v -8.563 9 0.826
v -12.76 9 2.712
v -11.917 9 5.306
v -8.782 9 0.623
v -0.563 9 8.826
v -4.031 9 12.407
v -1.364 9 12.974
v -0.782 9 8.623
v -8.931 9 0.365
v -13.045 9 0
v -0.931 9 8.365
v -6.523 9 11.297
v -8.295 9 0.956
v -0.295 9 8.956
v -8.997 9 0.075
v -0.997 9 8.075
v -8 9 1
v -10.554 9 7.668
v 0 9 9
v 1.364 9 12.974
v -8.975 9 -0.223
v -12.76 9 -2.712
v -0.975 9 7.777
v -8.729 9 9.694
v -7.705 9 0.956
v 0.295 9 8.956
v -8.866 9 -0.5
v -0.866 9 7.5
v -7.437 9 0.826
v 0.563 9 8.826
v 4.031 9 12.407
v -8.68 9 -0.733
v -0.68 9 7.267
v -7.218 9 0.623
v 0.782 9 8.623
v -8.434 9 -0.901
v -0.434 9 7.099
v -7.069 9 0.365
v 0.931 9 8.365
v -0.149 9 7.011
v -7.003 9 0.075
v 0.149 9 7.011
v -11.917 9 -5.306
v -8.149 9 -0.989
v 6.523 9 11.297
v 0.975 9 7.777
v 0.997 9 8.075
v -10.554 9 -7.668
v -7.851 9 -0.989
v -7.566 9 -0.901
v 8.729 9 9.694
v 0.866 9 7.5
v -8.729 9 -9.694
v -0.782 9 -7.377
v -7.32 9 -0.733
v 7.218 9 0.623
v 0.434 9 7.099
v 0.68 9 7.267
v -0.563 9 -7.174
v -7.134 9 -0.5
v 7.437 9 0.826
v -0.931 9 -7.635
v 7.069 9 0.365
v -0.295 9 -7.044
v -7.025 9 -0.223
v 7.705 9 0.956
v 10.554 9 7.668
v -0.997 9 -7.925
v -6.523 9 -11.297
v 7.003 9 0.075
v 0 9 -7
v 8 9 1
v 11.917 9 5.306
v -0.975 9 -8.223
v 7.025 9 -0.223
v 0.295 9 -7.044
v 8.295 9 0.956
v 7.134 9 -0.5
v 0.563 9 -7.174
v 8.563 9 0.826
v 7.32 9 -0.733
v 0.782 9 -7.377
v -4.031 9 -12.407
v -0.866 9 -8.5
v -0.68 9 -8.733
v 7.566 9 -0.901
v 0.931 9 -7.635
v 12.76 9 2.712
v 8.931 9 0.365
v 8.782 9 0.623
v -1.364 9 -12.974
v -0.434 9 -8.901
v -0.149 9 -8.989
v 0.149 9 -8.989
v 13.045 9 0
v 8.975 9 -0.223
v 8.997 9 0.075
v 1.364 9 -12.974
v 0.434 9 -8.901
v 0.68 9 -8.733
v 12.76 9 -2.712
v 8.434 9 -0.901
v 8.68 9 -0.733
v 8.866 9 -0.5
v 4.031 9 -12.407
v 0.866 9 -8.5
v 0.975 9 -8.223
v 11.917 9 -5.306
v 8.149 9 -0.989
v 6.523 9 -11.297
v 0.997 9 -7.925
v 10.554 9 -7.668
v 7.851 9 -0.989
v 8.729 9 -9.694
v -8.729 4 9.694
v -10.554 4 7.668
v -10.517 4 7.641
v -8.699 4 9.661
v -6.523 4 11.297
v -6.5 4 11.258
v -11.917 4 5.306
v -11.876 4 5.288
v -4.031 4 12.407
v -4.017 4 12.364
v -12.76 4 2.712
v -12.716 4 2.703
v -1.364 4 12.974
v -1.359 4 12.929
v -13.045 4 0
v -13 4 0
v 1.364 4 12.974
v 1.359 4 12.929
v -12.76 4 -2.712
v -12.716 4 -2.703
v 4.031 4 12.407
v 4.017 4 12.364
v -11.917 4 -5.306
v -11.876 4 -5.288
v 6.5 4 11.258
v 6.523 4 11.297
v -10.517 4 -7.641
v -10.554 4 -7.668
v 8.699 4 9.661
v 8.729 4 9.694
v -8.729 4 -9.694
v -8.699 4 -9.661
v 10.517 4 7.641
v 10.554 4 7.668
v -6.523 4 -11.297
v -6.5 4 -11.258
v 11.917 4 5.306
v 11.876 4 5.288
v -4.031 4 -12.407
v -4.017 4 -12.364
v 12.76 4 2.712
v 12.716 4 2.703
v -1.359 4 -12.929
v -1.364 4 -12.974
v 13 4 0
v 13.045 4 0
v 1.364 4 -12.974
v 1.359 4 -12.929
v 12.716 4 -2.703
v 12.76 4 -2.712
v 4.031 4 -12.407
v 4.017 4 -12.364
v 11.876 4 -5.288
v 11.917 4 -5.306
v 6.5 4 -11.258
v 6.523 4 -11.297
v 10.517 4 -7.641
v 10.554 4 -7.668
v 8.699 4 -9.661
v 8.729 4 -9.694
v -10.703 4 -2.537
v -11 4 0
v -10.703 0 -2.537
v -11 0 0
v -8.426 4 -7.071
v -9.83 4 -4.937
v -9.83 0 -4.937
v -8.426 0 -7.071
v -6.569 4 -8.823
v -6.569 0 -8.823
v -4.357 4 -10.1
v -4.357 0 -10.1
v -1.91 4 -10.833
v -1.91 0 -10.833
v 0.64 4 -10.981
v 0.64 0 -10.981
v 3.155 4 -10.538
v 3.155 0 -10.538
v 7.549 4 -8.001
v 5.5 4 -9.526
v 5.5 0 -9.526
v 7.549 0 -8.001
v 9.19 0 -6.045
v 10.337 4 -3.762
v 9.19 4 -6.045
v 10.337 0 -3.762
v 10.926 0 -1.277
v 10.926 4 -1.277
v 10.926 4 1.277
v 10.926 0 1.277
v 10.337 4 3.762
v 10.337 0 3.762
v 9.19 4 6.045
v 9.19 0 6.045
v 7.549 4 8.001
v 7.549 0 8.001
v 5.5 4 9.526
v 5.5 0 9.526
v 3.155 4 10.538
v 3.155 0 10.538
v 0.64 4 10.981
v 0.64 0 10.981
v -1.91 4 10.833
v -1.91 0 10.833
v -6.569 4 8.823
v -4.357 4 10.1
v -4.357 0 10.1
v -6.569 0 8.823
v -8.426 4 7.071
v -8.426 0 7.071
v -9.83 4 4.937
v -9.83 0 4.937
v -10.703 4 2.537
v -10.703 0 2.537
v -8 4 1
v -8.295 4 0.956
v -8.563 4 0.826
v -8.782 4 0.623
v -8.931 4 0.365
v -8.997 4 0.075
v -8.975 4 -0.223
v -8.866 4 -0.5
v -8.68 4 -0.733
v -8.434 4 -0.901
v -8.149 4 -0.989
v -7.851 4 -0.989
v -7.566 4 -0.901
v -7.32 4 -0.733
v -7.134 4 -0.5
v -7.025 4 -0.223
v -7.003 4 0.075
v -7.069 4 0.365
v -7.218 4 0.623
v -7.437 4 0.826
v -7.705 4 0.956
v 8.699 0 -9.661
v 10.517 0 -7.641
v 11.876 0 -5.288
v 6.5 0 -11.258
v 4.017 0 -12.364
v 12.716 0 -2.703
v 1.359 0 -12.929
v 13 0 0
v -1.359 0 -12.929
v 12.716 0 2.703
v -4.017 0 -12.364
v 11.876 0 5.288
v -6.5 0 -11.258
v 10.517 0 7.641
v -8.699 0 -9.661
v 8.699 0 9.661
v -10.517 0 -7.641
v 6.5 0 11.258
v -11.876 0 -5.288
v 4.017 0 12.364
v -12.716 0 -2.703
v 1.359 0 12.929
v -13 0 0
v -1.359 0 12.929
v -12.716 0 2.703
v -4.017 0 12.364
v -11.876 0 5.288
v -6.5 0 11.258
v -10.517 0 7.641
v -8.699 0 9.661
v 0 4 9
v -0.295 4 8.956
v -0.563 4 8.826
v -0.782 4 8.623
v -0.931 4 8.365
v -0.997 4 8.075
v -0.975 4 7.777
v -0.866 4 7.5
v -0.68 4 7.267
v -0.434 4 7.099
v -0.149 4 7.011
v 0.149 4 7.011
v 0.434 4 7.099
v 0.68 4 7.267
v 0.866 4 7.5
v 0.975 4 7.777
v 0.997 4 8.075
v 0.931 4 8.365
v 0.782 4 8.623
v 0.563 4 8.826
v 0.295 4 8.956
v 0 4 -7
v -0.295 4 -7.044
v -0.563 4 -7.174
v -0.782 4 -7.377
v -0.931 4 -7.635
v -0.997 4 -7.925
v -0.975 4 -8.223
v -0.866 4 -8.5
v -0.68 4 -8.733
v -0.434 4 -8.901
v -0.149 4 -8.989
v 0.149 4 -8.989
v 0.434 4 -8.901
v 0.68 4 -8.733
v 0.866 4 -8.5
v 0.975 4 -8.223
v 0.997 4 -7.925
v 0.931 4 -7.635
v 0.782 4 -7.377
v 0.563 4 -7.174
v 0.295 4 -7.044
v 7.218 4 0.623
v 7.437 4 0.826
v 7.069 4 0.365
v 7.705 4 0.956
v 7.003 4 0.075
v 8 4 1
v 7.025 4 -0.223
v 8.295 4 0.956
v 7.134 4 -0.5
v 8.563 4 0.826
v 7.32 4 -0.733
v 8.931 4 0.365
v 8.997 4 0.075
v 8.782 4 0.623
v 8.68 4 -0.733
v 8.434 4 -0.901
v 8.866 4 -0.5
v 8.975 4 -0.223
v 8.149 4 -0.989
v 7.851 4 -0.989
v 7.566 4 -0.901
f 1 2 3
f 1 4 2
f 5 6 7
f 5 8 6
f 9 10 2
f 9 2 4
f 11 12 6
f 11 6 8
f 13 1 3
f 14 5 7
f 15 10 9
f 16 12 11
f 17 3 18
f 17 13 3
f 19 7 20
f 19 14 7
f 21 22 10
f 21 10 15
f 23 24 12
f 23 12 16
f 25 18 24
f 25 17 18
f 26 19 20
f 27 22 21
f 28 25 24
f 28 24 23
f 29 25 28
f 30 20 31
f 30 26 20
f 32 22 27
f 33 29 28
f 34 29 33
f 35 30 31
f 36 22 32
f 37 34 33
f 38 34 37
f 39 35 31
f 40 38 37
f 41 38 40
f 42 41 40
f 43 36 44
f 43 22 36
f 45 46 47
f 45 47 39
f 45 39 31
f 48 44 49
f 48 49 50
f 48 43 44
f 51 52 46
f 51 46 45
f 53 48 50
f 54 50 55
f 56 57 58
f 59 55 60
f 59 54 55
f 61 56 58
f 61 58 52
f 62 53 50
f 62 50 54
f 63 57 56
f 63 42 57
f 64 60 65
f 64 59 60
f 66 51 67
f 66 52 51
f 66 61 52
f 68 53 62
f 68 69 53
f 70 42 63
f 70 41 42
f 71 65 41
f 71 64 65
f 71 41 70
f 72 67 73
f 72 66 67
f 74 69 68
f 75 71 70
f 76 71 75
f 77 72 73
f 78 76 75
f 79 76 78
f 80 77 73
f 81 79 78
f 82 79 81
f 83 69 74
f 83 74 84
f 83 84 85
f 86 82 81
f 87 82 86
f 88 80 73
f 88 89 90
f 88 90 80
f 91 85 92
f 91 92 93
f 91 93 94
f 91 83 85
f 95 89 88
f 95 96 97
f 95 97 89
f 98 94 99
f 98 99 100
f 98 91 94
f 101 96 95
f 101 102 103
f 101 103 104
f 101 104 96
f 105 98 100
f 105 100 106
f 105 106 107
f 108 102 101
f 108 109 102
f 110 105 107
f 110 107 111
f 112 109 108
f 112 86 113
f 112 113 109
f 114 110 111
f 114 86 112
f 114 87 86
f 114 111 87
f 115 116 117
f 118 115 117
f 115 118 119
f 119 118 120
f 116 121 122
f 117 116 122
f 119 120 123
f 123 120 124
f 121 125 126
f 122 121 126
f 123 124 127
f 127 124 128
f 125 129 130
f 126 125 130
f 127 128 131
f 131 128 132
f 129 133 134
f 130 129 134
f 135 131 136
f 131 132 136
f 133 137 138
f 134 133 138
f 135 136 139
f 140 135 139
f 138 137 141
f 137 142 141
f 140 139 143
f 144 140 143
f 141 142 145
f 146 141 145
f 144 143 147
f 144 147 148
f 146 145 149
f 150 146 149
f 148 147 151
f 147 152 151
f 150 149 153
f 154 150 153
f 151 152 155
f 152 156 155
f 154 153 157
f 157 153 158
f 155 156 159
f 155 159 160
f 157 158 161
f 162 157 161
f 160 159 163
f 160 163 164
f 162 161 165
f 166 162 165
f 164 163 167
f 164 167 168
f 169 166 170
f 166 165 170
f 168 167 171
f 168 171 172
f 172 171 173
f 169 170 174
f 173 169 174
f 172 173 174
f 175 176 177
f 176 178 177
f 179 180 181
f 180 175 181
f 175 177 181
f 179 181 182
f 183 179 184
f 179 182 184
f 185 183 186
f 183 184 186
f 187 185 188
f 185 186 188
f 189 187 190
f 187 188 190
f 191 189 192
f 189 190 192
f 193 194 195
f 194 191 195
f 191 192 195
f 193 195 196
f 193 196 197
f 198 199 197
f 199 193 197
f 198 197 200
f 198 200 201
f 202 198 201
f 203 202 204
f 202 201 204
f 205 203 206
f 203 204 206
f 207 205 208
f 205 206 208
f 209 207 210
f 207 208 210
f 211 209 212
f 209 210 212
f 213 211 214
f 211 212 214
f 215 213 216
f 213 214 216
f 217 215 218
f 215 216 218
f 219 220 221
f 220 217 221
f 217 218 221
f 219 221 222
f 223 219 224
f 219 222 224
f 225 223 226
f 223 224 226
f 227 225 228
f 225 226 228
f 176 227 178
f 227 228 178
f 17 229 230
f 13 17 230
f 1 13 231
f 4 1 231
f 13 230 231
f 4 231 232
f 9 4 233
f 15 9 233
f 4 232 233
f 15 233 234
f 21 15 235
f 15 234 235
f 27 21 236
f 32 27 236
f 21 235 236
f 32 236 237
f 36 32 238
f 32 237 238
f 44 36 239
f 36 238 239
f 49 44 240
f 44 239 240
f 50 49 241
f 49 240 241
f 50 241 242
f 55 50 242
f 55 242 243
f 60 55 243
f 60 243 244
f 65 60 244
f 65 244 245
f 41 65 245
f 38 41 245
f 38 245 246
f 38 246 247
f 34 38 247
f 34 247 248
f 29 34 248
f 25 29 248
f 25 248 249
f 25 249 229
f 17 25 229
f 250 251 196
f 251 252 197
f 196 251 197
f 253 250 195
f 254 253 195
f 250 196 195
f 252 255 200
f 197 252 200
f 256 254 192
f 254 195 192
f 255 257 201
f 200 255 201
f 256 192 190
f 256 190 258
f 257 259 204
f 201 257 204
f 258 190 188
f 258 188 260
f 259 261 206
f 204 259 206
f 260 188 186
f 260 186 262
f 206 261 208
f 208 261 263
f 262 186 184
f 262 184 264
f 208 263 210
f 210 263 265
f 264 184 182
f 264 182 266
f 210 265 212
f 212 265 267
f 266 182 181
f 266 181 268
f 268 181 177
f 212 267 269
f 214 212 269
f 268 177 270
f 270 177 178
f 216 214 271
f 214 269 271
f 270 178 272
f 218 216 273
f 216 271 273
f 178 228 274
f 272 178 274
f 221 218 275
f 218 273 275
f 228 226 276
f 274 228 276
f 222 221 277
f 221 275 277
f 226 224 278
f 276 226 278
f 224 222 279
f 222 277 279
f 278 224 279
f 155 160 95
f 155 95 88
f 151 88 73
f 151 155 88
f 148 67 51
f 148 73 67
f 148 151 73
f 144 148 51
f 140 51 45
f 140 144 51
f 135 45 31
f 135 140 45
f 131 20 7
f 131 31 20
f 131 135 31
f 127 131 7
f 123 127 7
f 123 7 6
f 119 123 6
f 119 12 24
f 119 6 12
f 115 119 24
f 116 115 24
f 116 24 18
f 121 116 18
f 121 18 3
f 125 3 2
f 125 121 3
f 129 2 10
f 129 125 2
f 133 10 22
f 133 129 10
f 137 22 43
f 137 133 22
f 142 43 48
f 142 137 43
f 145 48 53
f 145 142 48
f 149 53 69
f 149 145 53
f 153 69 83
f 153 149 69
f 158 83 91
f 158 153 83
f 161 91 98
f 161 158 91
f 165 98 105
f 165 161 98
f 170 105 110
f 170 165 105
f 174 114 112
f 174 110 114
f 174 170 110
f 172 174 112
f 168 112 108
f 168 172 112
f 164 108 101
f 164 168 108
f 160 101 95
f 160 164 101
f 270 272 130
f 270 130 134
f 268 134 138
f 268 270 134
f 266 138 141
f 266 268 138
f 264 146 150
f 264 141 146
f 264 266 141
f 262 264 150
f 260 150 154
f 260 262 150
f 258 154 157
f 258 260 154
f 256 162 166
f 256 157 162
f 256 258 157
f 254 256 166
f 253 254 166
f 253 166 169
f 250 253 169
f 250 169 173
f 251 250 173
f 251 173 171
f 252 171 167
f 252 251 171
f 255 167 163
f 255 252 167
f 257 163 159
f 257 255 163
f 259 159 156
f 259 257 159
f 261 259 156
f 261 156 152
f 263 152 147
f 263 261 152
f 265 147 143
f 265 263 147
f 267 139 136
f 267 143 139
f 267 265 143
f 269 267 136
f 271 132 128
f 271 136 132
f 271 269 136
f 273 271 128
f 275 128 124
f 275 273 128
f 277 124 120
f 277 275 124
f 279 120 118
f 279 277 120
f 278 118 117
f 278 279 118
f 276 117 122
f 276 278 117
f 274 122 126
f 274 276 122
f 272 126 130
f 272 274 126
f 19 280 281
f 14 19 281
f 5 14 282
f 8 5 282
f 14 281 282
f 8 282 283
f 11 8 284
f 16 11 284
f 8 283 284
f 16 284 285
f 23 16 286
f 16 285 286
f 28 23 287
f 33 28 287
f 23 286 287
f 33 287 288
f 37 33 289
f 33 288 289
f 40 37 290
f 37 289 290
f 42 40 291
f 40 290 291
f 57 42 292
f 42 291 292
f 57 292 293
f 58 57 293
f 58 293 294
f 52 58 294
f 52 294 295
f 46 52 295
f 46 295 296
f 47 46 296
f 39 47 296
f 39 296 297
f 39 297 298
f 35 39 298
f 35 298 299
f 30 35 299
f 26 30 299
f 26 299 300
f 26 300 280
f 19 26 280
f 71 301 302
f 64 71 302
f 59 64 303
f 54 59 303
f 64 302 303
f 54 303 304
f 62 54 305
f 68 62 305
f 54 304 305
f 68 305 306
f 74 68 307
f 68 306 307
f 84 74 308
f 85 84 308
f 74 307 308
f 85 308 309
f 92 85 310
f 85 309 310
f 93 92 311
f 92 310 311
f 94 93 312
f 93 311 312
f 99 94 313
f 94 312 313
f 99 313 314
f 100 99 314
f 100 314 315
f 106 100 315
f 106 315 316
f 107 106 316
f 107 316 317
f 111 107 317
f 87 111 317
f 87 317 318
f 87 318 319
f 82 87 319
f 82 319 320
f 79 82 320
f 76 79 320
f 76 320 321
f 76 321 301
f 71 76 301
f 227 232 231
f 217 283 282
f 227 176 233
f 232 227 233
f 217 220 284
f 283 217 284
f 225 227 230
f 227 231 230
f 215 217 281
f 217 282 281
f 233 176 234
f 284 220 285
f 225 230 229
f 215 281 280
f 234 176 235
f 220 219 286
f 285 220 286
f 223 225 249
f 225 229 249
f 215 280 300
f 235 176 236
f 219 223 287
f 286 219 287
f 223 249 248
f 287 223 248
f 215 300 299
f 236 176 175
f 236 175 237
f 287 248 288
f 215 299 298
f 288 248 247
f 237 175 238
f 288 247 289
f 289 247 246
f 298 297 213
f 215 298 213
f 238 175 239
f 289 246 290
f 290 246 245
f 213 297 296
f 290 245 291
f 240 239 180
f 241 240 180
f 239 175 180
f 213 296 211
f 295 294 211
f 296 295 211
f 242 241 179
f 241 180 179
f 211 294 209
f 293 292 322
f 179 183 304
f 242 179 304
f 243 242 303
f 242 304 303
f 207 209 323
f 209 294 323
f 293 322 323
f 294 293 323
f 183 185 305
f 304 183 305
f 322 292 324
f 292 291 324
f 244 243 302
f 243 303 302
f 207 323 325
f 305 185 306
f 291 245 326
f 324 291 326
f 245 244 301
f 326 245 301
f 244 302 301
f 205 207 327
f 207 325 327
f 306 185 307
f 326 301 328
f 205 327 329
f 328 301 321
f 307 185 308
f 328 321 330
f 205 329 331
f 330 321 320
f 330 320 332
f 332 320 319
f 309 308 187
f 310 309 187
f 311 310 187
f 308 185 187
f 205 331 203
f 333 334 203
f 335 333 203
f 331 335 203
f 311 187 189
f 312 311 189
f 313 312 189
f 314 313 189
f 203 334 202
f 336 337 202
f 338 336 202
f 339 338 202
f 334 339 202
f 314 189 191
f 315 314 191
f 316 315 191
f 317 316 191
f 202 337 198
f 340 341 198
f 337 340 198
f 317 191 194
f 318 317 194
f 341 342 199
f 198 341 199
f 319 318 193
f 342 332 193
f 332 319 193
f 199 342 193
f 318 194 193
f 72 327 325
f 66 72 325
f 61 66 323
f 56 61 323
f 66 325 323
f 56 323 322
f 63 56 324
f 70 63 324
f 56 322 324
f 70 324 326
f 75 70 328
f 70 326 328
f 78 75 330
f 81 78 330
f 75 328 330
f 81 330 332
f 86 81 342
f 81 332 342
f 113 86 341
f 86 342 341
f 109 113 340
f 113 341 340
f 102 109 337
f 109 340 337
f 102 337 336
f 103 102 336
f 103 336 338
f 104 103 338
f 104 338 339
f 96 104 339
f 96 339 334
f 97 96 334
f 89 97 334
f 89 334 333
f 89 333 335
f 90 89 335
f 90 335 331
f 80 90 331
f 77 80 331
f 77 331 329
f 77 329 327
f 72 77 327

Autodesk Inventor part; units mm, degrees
ref_plane "YZ Plane" through (0, 0, 0) normal (1, 0, 0) x (0, 1, 0)
ref_plane "XZ Plane" through (0, 0, 0) normal (0, 1, 0) x (-1, 0, 0)
ref_plane "XY Plane" through (0, 0, 0) normal (0, 0, 1) x (1, 0, 0)
sketch "Sketch1" plane through (0, 0, 0) normal (0, 1, 0) x (-1, 0, 0)
  circle A0 centre (0, 0) radius 11
  circle A1 centre (0, 0) radius 13
  dimension "d0" = 22
  dimension "d1" = 26
extrude "Extrusion1" add sketch "Sketch1" along normal blind 4
sketch "Sketch2" plane through (0, 4, 0) normal (0, 1, 0) x (1, 0, 0)
  circle A0 centre (0, 0) radius 13.0451
extrude "Extrusion2" add sketch "Sketch2" along normal blind 5
sketch "Sketch3" plane through (0, 9, 0) normal (0, 1, 0) x (1, 0, 0)
  circle A0 centre (0, 0) radius 8
  point P0 (-8, 0)
  point P1 (0, 8)
  point P2 (8, 0)
  point P3 (0, -8)
  dimension "d6" = 16
hole "Hole1" at (-8, 9, 0) at (0, 9, -8) at (8, 9, 0) at (0, 9, 8) direction (0, -1, 0) diameter 2 end through all
properties part number "General Mount"
